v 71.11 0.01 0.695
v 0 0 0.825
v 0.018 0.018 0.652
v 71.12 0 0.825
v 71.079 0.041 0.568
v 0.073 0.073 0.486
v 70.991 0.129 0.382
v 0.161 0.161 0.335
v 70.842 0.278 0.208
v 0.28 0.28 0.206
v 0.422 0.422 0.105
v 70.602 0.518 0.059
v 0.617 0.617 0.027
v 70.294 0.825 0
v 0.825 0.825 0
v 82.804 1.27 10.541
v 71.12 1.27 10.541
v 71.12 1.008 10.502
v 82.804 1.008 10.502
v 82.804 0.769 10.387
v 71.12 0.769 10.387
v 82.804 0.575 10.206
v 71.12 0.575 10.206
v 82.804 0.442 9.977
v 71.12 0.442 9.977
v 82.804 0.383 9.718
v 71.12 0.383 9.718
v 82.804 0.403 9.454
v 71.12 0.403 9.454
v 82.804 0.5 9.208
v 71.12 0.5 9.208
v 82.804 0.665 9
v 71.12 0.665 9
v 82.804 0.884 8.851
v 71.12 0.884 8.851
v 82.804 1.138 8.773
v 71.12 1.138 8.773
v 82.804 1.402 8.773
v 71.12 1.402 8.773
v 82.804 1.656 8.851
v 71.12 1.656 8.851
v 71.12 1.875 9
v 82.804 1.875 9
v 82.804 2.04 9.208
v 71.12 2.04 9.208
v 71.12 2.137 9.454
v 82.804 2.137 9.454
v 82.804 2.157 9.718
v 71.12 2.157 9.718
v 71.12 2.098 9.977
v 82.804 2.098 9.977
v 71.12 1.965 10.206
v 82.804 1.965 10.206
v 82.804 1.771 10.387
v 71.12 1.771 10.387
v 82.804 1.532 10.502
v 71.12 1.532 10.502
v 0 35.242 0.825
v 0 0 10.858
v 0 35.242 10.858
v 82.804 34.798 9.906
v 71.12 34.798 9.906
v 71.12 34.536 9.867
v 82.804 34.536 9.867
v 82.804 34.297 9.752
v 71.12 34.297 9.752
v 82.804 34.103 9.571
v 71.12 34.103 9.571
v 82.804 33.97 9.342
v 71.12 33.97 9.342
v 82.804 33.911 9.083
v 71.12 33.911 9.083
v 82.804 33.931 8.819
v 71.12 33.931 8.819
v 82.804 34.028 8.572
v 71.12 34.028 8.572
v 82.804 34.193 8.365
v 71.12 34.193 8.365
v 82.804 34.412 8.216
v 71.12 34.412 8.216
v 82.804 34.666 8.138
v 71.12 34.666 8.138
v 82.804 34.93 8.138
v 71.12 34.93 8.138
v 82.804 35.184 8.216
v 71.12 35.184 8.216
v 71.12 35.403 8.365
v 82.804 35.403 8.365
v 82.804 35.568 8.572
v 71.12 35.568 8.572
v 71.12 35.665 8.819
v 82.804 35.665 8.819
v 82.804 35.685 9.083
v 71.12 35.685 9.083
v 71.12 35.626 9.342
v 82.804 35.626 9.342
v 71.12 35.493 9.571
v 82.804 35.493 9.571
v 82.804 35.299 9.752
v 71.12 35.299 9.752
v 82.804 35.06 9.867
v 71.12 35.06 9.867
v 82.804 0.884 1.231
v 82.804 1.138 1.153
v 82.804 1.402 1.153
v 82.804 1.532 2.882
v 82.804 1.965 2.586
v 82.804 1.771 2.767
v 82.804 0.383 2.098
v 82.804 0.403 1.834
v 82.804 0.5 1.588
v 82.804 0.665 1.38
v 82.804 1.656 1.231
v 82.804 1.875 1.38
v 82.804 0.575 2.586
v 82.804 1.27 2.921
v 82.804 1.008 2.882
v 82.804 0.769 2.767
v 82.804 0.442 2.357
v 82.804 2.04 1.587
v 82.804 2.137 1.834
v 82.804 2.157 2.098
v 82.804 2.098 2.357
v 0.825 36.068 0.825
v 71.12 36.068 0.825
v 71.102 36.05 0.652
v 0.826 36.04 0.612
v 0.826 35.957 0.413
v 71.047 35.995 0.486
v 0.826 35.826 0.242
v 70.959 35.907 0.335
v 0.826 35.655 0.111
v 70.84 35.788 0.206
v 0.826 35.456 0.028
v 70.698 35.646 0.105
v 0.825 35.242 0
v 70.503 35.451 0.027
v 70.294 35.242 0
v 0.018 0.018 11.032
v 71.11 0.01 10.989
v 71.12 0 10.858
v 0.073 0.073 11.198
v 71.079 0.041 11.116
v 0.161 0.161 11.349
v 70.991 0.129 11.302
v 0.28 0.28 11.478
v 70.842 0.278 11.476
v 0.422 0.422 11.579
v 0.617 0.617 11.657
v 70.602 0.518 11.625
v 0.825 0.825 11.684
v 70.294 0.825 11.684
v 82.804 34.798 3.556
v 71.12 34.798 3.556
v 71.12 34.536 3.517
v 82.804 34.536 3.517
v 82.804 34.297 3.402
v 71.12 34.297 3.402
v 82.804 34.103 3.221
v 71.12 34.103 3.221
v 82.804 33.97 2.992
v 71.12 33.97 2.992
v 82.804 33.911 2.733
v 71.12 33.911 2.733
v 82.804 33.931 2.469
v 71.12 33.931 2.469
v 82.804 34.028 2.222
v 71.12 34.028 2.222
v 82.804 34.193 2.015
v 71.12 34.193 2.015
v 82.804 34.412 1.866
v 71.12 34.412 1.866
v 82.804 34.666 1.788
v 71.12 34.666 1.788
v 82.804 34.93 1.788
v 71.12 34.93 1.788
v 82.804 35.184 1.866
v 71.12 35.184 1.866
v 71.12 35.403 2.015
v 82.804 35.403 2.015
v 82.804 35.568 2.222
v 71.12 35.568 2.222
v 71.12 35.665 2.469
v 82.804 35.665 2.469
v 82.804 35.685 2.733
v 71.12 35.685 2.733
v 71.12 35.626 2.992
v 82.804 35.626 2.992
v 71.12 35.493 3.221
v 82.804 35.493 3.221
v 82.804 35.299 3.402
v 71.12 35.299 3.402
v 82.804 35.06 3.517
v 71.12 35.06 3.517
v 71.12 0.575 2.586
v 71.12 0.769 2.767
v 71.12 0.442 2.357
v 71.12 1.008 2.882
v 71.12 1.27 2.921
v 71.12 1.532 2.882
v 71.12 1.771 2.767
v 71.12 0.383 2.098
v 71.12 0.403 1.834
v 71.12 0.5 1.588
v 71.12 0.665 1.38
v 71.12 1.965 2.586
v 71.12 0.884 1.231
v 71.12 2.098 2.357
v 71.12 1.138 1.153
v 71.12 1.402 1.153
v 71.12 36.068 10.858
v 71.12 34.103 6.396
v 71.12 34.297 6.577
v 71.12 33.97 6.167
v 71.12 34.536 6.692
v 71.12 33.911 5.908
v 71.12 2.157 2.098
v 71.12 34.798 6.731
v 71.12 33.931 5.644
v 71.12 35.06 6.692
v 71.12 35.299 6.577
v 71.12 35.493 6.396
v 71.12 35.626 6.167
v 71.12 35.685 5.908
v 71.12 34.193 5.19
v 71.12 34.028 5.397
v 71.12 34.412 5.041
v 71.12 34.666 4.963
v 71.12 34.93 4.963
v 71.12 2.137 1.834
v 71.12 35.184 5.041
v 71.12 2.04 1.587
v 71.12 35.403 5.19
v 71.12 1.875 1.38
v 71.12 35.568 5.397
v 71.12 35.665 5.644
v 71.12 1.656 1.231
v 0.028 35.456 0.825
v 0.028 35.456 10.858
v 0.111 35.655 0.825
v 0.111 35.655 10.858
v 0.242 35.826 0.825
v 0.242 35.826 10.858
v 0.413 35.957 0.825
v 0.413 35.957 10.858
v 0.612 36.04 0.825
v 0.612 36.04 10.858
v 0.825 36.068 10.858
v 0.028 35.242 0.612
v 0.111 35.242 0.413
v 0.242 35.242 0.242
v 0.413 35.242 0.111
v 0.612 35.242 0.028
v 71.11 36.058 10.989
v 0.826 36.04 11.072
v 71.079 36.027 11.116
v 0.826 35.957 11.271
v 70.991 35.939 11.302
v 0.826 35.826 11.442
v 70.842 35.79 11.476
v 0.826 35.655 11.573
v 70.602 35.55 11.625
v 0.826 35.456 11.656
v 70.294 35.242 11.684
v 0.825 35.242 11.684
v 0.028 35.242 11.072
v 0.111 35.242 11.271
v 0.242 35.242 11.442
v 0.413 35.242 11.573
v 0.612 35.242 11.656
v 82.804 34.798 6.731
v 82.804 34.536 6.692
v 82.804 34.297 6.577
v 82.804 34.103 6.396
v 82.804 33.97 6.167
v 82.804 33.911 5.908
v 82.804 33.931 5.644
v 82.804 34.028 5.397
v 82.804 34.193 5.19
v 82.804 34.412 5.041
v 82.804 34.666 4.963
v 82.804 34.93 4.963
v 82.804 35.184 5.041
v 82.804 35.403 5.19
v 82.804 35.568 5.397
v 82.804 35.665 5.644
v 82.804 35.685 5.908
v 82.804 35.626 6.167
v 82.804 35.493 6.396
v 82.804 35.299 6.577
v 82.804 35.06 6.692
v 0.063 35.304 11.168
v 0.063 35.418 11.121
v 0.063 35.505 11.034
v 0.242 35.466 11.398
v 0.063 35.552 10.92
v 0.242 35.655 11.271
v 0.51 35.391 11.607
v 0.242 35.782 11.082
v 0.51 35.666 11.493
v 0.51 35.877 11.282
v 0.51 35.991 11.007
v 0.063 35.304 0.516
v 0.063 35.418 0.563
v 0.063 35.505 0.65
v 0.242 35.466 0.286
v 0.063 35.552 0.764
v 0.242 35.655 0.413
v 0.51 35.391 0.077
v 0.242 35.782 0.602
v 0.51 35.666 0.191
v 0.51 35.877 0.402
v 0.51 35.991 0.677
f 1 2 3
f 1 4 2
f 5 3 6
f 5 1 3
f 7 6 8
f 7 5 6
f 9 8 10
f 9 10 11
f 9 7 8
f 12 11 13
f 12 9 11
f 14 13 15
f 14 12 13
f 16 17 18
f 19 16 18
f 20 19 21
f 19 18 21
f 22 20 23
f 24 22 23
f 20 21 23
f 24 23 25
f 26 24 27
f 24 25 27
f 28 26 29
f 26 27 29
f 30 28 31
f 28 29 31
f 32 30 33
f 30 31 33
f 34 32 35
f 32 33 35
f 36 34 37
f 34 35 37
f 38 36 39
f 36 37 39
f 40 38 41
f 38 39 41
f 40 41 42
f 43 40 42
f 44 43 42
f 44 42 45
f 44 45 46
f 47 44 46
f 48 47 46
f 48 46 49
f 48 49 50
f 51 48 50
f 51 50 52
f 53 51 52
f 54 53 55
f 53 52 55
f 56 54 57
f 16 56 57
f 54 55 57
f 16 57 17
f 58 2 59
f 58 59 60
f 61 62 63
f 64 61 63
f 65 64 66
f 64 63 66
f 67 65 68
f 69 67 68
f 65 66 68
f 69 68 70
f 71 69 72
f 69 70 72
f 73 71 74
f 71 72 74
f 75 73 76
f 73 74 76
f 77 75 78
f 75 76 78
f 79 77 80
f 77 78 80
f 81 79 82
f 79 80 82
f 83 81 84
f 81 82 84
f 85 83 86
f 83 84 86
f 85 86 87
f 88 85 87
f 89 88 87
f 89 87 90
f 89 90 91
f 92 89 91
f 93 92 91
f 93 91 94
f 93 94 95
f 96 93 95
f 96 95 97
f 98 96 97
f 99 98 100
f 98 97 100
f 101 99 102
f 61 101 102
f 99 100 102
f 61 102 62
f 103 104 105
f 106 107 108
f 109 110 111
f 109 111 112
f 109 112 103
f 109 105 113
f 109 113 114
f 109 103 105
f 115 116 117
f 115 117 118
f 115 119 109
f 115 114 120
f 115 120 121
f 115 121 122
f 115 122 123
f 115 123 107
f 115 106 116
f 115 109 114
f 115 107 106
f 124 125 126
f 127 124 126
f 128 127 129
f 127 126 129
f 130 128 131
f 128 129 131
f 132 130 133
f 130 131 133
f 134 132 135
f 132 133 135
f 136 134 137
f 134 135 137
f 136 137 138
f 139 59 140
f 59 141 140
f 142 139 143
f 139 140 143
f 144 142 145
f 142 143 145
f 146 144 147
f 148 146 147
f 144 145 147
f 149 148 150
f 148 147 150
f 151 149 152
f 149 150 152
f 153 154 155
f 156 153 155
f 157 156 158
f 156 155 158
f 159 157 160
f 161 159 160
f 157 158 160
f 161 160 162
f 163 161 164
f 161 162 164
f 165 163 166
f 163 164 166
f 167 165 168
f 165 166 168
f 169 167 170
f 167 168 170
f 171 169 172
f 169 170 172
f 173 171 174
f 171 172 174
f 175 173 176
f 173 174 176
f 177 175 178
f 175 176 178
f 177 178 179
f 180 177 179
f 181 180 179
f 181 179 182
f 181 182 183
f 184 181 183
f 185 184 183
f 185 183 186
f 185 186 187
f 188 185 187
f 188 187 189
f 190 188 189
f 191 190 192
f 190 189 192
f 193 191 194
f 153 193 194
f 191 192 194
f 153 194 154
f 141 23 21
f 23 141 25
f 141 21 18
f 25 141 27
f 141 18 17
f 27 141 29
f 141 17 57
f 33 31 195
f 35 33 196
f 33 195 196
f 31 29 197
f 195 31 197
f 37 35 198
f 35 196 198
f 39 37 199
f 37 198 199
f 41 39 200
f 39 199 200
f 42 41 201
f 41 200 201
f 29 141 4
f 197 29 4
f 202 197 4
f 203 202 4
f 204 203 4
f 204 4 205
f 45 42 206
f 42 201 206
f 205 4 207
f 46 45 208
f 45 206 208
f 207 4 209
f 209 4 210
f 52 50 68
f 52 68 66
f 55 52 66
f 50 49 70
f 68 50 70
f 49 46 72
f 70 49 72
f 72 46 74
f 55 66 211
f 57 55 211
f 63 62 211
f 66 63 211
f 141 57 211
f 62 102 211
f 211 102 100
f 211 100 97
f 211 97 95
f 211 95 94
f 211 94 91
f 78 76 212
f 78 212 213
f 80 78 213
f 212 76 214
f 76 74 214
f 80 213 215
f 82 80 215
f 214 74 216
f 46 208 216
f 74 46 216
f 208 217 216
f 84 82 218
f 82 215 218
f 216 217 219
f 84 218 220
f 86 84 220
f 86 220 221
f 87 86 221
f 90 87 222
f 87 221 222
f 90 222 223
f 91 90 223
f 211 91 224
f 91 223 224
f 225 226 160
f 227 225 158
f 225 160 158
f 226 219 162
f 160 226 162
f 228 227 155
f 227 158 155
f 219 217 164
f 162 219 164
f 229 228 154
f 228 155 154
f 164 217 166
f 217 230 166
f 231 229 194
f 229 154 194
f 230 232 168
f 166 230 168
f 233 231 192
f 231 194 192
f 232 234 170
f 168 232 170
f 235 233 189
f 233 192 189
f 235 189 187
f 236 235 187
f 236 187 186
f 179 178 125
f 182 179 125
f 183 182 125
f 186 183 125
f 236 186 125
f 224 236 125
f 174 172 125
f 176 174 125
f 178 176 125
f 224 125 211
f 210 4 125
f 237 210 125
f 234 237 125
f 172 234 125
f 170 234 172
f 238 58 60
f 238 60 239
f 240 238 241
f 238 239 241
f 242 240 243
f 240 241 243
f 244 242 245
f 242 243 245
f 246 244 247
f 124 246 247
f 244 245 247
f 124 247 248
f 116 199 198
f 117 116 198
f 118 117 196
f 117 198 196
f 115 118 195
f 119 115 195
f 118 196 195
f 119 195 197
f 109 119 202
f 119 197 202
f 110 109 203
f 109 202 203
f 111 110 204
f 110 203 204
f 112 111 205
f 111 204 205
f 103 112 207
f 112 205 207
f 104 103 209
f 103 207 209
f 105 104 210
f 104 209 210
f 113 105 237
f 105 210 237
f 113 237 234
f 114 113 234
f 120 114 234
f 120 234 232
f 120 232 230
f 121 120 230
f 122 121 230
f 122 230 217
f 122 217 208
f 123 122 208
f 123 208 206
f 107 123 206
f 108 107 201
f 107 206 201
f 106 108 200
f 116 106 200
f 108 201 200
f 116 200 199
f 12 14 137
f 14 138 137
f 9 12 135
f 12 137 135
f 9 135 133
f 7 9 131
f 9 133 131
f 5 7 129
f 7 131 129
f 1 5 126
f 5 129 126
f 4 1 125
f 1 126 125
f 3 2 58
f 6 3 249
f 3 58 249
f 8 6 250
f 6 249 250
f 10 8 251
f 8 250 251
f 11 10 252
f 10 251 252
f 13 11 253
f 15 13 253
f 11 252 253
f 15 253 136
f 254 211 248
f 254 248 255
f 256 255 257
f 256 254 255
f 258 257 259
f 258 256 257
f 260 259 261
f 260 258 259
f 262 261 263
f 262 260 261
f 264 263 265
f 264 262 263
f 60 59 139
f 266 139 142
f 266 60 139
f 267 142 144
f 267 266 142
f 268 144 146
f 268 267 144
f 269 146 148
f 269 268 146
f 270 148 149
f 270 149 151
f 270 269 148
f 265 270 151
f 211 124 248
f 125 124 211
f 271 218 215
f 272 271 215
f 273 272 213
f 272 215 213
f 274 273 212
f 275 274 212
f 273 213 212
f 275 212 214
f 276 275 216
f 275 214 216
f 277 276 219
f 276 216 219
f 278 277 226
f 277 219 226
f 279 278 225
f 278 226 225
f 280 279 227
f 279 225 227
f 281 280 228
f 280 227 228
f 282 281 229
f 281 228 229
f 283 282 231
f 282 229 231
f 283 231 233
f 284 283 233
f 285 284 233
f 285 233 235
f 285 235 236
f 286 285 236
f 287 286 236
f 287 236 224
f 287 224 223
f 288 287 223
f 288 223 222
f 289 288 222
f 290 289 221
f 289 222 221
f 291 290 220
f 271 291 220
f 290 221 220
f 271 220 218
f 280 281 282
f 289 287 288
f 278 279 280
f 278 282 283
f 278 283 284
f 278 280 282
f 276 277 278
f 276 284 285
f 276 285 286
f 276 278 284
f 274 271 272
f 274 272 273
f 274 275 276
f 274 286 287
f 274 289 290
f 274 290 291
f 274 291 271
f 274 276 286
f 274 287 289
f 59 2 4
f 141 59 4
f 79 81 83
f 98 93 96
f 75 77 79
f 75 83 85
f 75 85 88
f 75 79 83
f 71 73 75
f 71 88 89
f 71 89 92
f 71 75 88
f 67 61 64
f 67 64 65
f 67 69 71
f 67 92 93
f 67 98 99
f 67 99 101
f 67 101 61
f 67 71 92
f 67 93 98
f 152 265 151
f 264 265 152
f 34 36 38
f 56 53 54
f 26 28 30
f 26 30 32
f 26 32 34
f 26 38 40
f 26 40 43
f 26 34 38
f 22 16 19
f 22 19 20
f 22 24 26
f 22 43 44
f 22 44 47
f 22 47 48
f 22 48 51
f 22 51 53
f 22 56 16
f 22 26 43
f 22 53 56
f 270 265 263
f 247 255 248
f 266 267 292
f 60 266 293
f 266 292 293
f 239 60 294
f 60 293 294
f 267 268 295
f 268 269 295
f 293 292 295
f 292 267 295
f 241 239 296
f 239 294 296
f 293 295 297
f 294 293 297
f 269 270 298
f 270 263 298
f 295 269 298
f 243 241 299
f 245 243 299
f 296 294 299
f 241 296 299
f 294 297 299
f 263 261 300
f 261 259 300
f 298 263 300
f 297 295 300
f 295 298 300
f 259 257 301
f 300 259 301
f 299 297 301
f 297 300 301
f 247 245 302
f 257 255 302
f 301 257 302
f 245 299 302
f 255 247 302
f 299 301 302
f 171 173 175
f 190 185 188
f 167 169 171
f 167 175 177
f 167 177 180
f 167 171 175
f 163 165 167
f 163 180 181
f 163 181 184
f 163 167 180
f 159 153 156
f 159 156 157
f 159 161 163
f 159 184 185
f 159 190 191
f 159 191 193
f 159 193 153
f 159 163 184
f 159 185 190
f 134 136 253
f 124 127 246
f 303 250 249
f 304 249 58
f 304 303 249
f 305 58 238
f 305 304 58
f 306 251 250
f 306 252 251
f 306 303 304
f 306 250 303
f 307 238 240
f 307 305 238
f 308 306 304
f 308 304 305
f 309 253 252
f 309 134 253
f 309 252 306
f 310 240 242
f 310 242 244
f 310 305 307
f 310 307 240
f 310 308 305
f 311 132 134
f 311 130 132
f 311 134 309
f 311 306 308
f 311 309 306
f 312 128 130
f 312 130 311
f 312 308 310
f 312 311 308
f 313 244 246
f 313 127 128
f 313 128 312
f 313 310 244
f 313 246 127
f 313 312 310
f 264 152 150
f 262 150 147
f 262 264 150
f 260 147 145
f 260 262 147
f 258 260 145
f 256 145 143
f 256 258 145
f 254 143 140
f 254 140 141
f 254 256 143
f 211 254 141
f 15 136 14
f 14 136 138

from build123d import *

# Parameters (mm, degrees)
SKETCH1_W           = 71.12
SKETCH1_H           = 36.068
BOSS_EXTRUDE1_DEPTH = 11.684
SKETCH2_R           = 0.889
BOSS_EXTRUDE2_DEPTH = 11.684
FILLET1_R           = 0.8255


with BuildPart() as part:
    # Sketch1 → Boss-Extrude1 (new body)
    with BuildSketch(Plane.XY):
        with Locations((35.56, 18.034)):
            Rectangle(SKETCH1_W, SKETCH1_H)
    extrude(amount=BOSS_EXTRUDE1_DEPTH)

    # Sketch2 → Boss-Extrude2 (add)
    with BuildSketch(Plane(origin=(71.12, 0, 0), x_dir=(0, 0, -1), z_dir=(1, 0, 0))):
        with Locations(Location((-9.652, 1.27, 0), (0, 0, 180))):
            Circle(SKETCH2_R)
        with Locations(Location((-2.032, 1.27, 0), (0, 0, 180))):
            Circle(SKETCH2_R)
        with Locations(Location((-9.017, 34.798, 0), (0, 0, 180))):
            Circle(SKETCH2_R)
        with Locations(Location((-5.842, 34.798, 0), (0, 0, 180))):
            Circle(SKETCH2_R)
        with Locations(Location((-2.667, 34.798, 0), (0, 0, 180))):
            Circle(SKETCH2_R)
    extrude(amount=BOSS_EXTRUDE2_DEPTH)

    # Fillet1
    fillet1_edges = [part.edges().sort_by_distance(p)[0] for p in [
        (71.12, 18.034, 11.684),
        (35.56, 36.068, 11.684),
        (0, 18.034, 11.684),
        (35.56, 36.068, 0),
        (71.12, 18.034, 0),
        (35.56, 0, 0),
        (0, 18.034, 0),
        (0, 36.068, 5.842),
        (35.56, 0, 11.684),
    ]]
    fillet(fillet1_edges, radius=FILLET1_R)


solid = part.part
